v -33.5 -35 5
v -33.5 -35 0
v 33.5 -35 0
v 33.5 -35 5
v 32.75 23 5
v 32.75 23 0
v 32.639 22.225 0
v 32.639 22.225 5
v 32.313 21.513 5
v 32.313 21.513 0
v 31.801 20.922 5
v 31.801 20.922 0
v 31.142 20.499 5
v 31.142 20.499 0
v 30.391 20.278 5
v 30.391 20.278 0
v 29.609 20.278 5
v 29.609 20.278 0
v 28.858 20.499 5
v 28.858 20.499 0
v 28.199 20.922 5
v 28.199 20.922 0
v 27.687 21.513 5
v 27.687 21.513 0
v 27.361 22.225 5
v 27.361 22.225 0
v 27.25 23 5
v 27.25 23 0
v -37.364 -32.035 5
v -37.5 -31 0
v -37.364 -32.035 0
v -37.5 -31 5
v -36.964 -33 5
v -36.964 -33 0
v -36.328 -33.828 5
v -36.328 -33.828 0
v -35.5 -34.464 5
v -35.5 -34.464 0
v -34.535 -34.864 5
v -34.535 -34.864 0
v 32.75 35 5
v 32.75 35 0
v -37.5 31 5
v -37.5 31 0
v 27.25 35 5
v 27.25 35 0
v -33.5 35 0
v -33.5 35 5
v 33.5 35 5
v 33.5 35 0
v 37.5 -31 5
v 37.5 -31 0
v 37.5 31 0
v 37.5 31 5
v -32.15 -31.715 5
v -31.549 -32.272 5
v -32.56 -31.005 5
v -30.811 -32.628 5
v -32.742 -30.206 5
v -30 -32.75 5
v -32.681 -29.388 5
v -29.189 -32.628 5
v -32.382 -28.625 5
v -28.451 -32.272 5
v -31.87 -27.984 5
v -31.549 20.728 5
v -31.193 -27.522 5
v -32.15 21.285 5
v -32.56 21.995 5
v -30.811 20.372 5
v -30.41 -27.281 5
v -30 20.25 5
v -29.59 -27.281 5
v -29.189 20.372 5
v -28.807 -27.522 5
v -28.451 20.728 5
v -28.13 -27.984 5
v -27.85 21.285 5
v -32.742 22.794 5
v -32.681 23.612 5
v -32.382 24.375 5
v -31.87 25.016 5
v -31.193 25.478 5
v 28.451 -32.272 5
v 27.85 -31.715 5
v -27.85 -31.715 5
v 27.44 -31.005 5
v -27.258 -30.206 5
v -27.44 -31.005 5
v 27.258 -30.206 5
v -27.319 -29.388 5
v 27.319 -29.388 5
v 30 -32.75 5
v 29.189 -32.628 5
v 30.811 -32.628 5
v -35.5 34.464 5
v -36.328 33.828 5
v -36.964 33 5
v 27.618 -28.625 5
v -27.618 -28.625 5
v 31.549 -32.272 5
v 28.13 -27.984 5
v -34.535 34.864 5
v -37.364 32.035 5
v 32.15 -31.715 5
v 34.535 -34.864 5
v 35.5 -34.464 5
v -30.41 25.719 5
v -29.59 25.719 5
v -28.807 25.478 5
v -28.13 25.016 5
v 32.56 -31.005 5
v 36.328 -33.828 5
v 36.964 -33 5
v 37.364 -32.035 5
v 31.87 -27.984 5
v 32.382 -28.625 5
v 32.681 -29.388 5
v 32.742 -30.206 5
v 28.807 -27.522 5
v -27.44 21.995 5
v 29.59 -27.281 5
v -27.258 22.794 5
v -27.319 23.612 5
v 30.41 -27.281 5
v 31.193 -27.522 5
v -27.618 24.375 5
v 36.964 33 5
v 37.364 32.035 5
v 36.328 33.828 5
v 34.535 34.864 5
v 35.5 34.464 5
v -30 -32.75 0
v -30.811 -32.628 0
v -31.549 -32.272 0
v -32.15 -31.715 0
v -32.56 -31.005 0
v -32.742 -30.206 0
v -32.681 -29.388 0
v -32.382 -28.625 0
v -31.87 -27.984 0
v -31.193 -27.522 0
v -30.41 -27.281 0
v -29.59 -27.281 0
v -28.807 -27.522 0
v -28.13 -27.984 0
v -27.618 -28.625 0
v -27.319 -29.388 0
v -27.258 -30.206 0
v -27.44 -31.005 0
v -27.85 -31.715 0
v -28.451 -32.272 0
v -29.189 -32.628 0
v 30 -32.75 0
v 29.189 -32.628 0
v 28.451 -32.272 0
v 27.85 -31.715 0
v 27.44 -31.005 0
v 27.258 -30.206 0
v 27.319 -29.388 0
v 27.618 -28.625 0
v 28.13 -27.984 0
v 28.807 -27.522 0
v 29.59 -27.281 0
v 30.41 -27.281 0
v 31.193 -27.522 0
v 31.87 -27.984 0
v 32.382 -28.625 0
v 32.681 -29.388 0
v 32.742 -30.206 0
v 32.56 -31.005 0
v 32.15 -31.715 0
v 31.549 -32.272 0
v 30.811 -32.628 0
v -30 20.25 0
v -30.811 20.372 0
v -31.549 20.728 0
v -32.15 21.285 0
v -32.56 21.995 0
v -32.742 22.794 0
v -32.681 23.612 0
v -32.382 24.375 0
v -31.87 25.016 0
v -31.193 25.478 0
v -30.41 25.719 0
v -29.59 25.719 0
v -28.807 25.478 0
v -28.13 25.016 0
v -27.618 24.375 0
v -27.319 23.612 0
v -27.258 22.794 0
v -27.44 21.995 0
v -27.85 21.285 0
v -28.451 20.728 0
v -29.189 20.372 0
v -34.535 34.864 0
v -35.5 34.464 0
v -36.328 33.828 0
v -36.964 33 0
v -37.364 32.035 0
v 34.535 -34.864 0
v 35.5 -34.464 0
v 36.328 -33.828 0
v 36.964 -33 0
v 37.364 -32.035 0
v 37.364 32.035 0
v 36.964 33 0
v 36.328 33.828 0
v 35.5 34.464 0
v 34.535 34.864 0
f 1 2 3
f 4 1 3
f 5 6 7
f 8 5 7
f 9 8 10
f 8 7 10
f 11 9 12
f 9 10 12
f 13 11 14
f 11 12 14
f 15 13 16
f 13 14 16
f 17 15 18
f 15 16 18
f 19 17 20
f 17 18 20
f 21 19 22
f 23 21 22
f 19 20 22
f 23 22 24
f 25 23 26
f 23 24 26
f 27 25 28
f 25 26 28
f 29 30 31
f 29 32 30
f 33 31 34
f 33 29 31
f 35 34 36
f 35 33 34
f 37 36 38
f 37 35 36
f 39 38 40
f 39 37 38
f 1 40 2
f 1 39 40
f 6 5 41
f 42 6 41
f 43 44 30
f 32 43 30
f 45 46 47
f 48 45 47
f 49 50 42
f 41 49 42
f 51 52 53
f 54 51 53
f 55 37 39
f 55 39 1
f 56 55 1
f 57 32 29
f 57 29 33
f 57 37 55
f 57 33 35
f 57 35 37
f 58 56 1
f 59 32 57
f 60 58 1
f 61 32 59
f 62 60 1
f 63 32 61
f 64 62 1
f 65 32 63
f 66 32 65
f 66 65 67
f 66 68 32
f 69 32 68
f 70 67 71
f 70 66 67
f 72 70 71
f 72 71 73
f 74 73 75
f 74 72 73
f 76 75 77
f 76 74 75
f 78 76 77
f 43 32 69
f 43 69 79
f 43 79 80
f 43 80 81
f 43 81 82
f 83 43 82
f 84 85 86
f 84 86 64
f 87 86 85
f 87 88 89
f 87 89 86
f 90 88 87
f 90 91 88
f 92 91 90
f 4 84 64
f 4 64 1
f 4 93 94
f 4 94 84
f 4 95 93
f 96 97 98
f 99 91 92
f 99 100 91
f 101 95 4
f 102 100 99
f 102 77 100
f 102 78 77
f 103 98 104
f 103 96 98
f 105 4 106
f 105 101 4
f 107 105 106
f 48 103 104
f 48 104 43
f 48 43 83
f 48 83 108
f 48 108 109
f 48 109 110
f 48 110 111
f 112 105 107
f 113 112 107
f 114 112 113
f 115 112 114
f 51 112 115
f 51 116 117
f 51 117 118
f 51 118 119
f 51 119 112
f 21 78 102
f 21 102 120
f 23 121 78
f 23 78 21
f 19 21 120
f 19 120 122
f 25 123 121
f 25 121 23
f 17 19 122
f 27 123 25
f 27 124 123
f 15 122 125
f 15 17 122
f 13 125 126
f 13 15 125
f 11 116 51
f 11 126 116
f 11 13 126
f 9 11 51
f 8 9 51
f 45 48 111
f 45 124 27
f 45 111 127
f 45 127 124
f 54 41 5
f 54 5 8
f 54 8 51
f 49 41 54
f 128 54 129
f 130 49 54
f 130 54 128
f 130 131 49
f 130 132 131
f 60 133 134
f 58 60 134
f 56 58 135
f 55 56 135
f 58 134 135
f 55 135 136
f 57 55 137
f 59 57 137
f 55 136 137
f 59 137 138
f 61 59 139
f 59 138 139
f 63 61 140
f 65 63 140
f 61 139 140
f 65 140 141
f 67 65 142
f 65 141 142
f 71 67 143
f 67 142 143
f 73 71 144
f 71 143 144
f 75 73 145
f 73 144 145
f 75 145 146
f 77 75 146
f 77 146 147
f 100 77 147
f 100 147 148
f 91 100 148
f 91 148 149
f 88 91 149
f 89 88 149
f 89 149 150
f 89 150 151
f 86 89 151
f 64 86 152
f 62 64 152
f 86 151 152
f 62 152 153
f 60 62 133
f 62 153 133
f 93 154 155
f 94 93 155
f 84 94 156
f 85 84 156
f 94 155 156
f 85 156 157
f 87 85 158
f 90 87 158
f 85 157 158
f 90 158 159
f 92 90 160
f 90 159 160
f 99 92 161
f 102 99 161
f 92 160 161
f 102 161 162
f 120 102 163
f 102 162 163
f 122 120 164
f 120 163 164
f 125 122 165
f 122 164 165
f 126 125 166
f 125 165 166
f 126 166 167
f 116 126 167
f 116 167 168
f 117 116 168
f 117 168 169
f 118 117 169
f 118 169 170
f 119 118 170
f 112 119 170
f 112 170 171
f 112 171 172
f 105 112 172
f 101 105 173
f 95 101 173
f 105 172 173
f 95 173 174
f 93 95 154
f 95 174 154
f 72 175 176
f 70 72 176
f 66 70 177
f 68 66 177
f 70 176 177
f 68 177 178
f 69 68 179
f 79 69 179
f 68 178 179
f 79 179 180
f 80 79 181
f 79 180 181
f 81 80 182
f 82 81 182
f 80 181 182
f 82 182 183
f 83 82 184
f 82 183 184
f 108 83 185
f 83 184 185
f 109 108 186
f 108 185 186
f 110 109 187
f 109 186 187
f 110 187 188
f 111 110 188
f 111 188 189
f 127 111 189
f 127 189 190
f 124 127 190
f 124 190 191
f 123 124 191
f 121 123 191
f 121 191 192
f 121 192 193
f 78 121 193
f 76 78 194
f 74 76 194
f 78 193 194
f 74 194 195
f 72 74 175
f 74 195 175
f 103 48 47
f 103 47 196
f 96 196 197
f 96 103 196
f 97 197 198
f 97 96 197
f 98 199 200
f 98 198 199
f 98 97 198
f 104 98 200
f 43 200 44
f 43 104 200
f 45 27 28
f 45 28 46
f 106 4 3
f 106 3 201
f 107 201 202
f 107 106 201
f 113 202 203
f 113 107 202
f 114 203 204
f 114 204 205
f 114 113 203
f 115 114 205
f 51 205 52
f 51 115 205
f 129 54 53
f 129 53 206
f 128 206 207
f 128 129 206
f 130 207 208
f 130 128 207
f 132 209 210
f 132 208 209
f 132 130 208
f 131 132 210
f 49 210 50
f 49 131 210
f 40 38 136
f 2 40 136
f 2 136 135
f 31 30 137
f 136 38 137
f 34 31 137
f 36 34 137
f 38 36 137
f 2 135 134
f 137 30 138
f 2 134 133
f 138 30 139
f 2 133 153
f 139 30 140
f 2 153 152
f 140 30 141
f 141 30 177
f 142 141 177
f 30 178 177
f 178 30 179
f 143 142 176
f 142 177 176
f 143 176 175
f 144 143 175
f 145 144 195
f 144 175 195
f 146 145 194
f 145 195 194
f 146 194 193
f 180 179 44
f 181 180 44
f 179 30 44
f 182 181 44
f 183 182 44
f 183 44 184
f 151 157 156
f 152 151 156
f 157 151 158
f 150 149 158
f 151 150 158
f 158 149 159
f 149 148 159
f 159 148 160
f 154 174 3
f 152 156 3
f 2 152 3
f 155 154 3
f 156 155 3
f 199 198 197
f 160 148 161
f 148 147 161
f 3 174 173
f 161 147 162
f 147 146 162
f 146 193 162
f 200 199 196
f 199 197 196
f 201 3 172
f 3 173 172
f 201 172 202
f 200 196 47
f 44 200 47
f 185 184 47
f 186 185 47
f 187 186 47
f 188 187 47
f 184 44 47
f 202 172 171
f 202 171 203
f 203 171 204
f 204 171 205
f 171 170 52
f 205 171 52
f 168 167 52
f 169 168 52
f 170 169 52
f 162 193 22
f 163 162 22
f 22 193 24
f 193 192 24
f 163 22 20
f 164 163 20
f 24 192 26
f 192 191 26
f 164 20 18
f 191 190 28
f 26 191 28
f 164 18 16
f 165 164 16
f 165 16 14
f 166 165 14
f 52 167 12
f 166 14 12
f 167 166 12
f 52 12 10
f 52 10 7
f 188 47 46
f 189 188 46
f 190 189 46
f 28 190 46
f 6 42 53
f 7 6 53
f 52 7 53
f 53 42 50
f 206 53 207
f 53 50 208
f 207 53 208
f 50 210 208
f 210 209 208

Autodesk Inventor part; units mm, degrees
ref_plane "YZ Plane" through (0, 0, 0) normal (1, 0, 0) x (0, 1, 0)
ref_plane "XZ Plane" through (0, 0, 0) normal (0, 1, 0) x (-1, 0, 0)
ref_plane "XY Plane" through (0, 0, 0) normal (0, 0, 1) x (1, 0, 0)
sketch "Sketch1" plane through (0, 0, 0) normal (0, 0, 1) x (1, 0, 0)
  line L0 (-37.5, -35) -> (37.5, -35)
  line L1 (37.5, -35) -> (37.5, 35)
  line L2 (37.5, 35) -> (-37.5, 35)
  line L3 (-37.5, 35) -> (-37.5, -35)
  line L4 (-37.5, -35) -> (37.5, 35) construction
  line L5 (37.5, -35) -> (-37.5, 35) construction
  point P0 (0, 0)
  dimension "d0" = 75
  dimension "d1" = 70
extrude "Extrusion1" add sketch "Sketch1" along normal blind 5
sketch "Sketch2" plane through (0, 0, 5) normal (0, 0, 1) x (1, 0, 0)
  line L0 (-30, -30) -> (30, -30) construction
  line L1 (-37.5, -35) -> (37.5, -35) construction
  line L2 (-30, 23) -> (30, 23) construction
  point P0 (0, 0)
  point P1 (0, -30)
  dimension "d4" = 60
  dimension "d5" = 5
  dimension "d6" = 60
  dimension "d7" = 58
  dimension "d8" = 30
hole "Hole1" at (-30, -30, 5) at (30, -30, 5) at (30, 23, 5) at (-30, 23, 5) direction (0, 0, -1) diameter 5.5 depth 8 tip angle 118 clearance for "Countersunk Flat Head Screw DIN EN ISO 2009" size "M5" standard "DIN"
fillet "Fillet1" radius 4 4 edges at (-37.5, 35, 2.5) (37.5, 35, 2.5) (-37.5, -35, 2.5) (37.5, -35, 2.5)
sketch "Sketch3" plane through (0, 0, 5) normal (0, 0, 1) x (1, 0, 0)
  circle A0 centre (30, 23) radius 2.75 projected
  line L0 (27.25, 23) -> (27.25, 35)
  line L1 (33.5, 35) -> (-33.5, 35) projected
  line L2 (32.75, 23) -> (32.75, 35)
  line L3 (32.75, 35) -> (27.25, 35)
  line L4 (32.75, 23) -> (27.25, 23)
  point P0 (0, 0)
extrude "Extrusion2" cut sketch "Sketch3" against normal blind 5 contours A0 L0 L1 L2
properties part number "Halter_Tesla" material "Polycarbonate, Clear"
